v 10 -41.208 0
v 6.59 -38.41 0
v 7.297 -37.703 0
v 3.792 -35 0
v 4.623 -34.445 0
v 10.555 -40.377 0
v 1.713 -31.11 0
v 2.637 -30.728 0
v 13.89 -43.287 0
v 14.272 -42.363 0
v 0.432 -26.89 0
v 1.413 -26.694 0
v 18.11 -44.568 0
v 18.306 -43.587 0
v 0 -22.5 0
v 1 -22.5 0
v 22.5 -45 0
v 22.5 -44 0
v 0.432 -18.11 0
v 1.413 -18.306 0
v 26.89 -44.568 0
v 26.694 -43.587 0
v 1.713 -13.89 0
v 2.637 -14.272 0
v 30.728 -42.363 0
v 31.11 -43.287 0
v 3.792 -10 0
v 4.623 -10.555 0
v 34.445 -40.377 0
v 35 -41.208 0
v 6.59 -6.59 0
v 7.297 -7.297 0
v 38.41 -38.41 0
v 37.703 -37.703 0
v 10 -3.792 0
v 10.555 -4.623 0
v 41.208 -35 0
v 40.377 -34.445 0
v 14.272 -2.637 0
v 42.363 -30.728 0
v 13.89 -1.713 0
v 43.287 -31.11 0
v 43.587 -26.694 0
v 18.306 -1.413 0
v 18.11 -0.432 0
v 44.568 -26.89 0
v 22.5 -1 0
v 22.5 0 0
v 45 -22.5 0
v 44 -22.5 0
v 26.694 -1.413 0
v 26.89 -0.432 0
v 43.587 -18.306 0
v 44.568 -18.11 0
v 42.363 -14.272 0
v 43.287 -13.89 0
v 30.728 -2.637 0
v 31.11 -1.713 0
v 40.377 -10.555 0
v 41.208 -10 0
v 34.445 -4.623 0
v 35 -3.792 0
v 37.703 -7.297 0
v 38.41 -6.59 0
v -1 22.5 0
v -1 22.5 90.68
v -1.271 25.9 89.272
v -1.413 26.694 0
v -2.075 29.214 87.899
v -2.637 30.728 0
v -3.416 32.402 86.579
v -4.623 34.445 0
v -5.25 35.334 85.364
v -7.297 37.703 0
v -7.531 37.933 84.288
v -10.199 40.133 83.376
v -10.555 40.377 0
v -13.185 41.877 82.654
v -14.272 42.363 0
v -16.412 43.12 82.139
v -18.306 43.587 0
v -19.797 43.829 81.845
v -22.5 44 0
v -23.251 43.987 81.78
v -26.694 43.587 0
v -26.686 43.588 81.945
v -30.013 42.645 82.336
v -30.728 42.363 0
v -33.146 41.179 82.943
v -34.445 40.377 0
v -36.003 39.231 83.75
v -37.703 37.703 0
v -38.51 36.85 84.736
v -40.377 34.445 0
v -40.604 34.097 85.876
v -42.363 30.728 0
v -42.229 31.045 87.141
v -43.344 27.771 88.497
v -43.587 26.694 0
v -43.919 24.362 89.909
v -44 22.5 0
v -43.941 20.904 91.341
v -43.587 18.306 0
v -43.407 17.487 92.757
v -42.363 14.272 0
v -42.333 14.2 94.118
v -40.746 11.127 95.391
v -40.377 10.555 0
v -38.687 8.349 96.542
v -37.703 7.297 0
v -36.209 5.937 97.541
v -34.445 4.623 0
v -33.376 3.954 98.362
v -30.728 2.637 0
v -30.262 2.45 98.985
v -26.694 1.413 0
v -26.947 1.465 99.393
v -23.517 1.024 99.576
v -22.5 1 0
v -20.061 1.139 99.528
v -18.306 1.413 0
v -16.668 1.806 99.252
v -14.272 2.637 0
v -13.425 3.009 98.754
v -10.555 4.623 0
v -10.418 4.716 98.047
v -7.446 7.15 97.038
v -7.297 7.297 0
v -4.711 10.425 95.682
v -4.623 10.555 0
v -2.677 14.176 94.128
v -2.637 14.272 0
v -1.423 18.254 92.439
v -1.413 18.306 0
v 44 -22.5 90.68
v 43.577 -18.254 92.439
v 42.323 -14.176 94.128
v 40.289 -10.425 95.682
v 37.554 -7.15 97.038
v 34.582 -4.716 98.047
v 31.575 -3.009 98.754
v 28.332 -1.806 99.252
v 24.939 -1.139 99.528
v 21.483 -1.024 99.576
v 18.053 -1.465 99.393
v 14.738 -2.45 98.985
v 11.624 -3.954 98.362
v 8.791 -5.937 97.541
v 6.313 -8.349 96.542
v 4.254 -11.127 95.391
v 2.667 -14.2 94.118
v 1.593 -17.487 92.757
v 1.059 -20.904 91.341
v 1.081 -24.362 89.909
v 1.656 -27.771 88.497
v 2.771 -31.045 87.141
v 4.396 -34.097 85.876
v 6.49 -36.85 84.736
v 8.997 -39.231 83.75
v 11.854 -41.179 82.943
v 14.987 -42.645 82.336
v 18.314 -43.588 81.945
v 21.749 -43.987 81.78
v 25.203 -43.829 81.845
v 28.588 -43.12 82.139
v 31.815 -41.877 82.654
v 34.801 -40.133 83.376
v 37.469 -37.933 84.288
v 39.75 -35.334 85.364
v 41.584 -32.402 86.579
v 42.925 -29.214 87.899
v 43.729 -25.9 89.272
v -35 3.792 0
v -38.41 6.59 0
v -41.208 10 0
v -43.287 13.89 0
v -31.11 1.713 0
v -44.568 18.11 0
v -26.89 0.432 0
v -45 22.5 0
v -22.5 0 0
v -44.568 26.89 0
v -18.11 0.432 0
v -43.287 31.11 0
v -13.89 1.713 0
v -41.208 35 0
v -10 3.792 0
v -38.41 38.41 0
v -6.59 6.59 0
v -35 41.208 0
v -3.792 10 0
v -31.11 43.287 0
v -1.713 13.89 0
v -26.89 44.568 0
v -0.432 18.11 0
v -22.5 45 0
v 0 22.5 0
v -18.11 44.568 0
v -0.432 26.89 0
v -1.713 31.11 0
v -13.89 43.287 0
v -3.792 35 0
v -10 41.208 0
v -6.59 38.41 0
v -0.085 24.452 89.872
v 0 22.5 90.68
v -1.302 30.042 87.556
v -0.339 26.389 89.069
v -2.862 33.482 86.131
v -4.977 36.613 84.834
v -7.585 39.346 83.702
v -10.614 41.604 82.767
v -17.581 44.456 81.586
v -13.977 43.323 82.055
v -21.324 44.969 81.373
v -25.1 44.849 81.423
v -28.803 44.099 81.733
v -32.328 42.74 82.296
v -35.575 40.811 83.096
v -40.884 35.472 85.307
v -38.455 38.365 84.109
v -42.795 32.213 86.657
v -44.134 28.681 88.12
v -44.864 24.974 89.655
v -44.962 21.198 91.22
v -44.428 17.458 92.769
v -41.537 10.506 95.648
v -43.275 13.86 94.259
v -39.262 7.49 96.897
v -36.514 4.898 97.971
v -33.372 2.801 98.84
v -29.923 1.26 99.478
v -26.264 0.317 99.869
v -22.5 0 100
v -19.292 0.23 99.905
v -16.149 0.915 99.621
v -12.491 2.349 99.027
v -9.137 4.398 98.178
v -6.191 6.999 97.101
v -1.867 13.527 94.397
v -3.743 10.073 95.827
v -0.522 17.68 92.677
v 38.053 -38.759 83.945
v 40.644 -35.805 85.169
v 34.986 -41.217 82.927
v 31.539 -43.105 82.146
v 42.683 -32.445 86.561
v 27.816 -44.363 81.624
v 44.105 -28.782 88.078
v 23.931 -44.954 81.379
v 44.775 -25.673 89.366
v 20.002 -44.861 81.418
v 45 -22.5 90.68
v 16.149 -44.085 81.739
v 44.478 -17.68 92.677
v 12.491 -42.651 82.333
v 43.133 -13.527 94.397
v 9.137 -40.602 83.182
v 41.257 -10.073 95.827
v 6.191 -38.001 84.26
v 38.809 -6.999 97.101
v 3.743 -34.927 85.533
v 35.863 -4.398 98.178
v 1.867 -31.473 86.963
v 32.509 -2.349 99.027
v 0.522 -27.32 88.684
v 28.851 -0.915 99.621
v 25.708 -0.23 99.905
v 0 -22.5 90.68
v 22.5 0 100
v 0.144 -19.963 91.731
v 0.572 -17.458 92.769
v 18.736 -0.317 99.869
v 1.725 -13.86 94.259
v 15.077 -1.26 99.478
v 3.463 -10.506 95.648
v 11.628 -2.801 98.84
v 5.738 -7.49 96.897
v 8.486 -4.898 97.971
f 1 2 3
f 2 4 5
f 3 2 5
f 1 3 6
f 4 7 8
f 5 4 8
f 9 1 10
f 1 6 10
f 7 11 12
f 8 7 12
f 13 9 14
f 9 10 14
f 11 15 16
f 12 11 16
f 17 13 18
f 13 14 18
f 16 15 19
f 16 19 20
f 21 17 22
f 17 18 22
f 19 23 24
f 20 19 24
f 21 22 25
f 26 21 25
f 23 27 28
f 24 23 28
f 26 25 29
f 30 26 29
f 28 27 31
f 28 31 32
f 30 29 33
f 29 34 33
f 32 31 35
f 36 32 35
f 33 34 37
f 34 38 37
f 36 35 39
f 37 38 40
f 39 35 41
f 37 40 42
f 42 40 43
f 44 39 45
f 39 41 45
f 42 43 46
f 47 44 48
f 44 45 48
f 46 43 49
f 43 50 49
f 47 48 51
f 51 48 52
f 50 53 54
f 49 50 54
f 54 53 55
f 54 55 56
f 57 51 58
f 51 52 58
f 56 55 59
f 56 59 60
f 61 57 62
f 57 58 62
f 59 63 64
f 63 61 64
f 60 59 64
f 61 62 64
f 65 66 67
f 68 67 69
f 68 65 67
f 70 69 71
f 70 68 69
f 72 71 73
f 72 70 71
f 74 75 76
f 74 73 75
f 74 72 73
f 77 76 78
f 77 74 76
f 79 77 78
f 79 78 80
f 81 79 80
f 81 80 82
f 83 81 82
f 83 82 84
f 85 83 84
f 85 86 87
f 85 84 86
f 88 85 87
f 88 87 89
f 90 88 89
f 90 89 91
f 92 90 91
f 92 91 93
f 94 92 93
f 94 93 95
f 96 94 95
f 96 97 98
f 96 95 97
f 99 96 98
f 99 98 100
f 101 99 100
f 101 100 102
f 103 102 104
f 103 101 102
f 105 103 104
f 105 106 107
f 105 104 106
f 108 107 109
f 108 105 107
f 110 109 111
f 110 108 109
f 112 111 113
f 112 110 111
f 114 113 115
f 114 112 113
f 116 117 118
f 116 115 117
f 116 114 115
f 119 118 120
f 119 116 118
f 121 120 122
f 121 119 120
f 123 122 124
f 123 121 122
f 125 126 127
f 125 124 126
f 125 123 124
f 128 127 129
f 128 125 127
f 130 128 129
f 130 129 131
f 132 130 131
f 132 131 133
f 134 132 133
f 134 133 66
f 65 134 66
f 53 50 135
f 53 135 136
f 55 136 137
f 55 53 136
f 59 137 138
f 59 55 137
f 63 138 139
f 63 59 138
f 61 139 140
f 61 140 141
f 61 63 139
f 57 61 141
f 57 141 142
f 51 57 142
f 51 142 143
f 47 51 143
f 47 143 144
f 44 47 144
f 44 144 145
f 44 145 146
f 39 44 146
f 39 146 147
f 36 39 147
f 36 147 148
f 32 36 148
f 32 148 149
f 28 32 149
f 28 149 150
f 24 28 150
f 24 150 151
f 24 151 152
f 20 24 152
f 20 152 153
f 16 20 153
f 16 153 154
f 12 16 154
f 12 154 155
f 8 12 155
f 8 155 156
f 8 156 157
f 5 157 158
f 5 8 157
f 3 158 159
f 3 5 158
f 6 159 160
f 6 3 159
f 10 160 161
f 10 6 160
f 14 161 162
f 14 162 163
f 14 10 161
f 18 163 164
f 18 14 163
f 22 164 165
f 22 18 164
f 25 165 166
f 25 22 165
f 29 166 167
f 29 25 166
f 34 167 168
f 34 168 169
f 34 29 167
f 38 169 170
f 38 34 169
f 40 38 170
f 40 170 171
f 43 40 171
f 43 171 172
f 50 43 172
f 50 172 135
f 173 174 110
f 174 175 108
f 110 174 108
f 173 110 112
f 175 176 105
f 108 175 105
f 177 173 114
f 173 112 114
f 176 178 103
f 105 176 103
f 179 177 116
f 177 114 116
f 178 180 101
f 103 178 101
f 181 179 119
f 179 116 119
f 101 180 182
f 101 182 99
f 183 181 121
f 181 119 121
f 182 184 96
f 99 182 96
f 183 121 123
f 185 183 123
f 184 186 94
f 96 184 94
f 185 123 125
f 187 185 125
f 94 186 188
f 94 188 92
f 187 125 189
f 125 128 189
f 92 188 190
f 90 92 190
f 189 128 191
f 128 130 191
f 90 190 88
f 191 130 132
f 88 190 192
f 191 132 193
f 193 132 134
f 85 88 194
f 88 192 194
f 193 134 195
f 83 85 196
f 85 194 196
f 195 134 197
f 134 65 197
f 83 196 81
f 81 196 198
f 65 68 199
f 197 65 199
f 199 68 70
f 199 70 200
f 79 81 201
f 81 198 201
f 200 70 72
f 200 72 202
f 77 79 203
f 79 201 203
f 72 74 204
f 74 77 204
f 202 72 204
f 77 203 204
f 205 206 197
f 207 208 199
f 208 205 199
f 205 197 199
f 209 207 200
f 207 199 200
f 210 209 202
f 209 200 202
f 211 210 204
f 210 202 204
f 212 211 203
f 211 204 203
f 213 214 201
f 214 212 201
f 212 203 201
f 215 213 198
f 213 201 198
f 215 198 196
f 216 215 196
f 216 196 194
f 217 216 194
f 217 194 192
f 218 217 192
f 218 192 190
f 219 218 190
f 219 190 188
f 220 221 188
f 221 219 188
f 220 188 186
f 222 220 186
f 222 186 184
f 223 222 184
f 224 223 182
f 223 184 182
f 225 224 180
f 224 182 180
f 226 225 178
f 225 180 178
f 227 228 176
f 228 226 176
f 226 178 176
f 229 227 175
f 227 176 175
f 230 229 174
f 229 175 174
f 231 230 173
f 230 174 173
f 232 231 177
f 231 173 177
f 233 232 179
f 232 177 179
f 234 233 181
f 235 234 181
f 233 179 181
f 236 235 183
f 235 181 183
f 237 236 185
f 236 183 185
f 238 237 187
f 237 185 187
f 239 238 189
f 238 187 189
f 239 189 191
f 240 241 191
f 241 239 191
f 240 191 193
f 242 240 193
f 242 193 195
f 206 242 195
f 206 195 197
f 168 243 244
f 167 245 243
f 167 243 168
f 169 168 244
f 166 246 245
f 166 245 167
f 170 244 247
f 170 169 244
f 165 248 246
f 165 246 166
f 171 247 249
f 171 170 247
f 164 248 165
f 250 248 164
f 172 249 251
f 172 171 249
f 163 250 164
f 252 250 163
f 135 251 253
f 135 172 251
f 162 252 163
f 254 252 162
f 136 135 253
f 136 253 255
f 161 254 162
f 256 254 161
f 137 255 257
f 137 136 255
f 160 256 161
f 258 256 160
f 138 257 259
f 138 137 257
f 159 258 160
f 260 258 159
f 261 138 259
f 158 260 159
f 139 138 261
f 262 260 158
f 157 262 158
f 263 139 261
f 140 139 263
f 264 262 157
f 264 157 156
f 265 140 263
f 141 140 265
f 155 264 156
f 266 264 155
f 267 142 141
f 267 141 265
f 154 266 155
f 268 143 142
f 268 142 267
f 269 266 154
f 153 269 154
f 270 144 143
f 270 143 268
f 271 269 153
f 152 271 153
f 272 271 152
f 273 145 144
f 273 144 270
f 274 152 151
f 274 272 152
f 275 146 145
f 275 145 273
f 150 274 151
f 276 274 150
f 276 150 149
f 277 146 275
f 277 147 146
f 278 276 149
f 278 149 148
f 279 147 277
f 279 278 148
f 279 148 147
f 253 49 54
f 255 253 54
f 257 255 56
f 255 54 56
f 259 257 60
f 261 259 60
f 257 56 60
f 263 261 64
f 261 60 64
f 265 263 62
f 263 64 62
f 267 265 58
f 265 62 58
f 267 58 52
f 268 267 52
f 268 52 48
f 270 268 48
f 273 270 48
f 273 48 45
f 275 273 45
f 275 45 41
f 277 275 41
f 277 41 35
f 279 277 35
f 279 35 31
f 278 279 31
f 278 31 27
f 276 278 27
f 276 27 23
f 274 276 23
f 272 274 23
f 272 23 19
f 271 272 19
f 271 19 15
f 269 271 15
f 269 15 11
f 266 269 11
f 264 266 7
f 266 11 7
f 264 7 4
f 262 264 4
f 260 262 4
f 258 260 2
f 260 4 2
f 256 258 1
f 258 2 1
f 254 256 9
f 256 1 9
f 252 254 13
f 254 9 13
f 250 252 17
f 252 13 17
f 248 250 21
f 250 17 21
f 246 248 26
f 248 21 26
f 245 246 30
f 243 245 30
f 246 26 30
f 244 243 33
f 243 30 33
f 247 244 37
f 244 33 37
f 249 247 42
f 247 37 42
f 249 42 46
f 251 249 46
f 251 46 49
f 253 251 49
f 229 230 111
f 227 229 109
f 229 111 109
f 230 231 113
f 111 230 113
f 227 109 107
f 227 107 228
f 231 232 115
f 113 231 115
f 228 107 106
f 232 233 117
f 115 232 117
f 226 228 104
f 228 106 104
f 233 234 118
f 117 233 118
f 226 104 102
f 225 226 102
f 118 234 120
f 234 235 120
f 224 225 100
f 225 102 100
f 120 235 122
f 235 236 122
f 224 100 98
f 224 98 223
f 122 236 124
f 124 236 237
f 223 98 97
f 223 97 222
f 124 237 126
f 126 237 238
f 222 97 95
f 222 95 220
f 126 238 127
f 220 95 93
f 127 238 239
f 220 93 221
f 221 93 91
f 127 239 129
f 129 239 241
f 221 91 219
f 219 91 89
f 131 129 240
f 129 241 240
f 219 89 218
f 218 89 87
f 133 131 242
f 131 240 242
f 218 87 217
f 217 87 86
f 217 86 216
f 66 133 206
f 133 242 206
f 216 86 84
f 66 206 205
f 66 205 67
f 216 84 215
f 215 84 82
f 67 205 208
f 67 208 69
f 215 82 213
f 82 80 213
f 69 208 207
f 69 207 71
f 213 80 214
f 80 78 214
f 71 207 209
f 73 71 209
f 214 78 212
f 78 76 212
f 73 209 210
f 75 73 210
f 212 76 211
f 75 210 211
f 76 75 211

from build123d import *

# Parameters (mm, degrees)
F0_R     = 22.5
F0_R_2   = 21.5
F1_DEPTH = 100
F3_DEPTH = 100
F4_R     = 22.5
F4_R_2   = 21.5
F5_DEPTH = 100
F7_DEPTH = 100


with BuildPart() as f1:
    # F0 (on Top) → F1 (new body)
    with BuildSketch(Plane.XY):
        with Locations((-22.5, 22.5)):
            Circle(F0_R)
        with Locations((-22.5, 22.5)):
            Circle(F0_R_2, mode=Mode.SUBTRACT)
    extrude(amount=F1_DEPTH)

    # F2 (on Right) → F3 (cut)
    with BuildSketch(Plane.YZ):
        Polygon((0, 114.382386), (0, 100), (48.670089, 79.840189), (48.670089, 114.382386), align=None)
    extrude(amount=-F3_DEPTH, mode=Mode.SUBTRACT)


with BuildPart() as f5:
    # F4 (on Top) → F5 (new body)
    with BuildSketch(Plane.XY):
        with Locations((22.5, -22.5)):
            Circle(F4_R)
        with Locations((22.5, -22.5)):
            Circle(F4_R_2, mode=Mode.SUBTRACT)
    extrude(amount=F5_DEPTH)

    # F6 (on Right) → F7 (cut)
    with BuildSketch(Plane.YZ):
        Polygon((-57.519599, 76.174602), (0, 100), (0, 116.917327), (-57.519599, 116.917327), align=None)
    extrude(amount=F7_DEPTH, mode=Mode.SUBTRACT)


solid = Compound([f1.part, f5.part])
